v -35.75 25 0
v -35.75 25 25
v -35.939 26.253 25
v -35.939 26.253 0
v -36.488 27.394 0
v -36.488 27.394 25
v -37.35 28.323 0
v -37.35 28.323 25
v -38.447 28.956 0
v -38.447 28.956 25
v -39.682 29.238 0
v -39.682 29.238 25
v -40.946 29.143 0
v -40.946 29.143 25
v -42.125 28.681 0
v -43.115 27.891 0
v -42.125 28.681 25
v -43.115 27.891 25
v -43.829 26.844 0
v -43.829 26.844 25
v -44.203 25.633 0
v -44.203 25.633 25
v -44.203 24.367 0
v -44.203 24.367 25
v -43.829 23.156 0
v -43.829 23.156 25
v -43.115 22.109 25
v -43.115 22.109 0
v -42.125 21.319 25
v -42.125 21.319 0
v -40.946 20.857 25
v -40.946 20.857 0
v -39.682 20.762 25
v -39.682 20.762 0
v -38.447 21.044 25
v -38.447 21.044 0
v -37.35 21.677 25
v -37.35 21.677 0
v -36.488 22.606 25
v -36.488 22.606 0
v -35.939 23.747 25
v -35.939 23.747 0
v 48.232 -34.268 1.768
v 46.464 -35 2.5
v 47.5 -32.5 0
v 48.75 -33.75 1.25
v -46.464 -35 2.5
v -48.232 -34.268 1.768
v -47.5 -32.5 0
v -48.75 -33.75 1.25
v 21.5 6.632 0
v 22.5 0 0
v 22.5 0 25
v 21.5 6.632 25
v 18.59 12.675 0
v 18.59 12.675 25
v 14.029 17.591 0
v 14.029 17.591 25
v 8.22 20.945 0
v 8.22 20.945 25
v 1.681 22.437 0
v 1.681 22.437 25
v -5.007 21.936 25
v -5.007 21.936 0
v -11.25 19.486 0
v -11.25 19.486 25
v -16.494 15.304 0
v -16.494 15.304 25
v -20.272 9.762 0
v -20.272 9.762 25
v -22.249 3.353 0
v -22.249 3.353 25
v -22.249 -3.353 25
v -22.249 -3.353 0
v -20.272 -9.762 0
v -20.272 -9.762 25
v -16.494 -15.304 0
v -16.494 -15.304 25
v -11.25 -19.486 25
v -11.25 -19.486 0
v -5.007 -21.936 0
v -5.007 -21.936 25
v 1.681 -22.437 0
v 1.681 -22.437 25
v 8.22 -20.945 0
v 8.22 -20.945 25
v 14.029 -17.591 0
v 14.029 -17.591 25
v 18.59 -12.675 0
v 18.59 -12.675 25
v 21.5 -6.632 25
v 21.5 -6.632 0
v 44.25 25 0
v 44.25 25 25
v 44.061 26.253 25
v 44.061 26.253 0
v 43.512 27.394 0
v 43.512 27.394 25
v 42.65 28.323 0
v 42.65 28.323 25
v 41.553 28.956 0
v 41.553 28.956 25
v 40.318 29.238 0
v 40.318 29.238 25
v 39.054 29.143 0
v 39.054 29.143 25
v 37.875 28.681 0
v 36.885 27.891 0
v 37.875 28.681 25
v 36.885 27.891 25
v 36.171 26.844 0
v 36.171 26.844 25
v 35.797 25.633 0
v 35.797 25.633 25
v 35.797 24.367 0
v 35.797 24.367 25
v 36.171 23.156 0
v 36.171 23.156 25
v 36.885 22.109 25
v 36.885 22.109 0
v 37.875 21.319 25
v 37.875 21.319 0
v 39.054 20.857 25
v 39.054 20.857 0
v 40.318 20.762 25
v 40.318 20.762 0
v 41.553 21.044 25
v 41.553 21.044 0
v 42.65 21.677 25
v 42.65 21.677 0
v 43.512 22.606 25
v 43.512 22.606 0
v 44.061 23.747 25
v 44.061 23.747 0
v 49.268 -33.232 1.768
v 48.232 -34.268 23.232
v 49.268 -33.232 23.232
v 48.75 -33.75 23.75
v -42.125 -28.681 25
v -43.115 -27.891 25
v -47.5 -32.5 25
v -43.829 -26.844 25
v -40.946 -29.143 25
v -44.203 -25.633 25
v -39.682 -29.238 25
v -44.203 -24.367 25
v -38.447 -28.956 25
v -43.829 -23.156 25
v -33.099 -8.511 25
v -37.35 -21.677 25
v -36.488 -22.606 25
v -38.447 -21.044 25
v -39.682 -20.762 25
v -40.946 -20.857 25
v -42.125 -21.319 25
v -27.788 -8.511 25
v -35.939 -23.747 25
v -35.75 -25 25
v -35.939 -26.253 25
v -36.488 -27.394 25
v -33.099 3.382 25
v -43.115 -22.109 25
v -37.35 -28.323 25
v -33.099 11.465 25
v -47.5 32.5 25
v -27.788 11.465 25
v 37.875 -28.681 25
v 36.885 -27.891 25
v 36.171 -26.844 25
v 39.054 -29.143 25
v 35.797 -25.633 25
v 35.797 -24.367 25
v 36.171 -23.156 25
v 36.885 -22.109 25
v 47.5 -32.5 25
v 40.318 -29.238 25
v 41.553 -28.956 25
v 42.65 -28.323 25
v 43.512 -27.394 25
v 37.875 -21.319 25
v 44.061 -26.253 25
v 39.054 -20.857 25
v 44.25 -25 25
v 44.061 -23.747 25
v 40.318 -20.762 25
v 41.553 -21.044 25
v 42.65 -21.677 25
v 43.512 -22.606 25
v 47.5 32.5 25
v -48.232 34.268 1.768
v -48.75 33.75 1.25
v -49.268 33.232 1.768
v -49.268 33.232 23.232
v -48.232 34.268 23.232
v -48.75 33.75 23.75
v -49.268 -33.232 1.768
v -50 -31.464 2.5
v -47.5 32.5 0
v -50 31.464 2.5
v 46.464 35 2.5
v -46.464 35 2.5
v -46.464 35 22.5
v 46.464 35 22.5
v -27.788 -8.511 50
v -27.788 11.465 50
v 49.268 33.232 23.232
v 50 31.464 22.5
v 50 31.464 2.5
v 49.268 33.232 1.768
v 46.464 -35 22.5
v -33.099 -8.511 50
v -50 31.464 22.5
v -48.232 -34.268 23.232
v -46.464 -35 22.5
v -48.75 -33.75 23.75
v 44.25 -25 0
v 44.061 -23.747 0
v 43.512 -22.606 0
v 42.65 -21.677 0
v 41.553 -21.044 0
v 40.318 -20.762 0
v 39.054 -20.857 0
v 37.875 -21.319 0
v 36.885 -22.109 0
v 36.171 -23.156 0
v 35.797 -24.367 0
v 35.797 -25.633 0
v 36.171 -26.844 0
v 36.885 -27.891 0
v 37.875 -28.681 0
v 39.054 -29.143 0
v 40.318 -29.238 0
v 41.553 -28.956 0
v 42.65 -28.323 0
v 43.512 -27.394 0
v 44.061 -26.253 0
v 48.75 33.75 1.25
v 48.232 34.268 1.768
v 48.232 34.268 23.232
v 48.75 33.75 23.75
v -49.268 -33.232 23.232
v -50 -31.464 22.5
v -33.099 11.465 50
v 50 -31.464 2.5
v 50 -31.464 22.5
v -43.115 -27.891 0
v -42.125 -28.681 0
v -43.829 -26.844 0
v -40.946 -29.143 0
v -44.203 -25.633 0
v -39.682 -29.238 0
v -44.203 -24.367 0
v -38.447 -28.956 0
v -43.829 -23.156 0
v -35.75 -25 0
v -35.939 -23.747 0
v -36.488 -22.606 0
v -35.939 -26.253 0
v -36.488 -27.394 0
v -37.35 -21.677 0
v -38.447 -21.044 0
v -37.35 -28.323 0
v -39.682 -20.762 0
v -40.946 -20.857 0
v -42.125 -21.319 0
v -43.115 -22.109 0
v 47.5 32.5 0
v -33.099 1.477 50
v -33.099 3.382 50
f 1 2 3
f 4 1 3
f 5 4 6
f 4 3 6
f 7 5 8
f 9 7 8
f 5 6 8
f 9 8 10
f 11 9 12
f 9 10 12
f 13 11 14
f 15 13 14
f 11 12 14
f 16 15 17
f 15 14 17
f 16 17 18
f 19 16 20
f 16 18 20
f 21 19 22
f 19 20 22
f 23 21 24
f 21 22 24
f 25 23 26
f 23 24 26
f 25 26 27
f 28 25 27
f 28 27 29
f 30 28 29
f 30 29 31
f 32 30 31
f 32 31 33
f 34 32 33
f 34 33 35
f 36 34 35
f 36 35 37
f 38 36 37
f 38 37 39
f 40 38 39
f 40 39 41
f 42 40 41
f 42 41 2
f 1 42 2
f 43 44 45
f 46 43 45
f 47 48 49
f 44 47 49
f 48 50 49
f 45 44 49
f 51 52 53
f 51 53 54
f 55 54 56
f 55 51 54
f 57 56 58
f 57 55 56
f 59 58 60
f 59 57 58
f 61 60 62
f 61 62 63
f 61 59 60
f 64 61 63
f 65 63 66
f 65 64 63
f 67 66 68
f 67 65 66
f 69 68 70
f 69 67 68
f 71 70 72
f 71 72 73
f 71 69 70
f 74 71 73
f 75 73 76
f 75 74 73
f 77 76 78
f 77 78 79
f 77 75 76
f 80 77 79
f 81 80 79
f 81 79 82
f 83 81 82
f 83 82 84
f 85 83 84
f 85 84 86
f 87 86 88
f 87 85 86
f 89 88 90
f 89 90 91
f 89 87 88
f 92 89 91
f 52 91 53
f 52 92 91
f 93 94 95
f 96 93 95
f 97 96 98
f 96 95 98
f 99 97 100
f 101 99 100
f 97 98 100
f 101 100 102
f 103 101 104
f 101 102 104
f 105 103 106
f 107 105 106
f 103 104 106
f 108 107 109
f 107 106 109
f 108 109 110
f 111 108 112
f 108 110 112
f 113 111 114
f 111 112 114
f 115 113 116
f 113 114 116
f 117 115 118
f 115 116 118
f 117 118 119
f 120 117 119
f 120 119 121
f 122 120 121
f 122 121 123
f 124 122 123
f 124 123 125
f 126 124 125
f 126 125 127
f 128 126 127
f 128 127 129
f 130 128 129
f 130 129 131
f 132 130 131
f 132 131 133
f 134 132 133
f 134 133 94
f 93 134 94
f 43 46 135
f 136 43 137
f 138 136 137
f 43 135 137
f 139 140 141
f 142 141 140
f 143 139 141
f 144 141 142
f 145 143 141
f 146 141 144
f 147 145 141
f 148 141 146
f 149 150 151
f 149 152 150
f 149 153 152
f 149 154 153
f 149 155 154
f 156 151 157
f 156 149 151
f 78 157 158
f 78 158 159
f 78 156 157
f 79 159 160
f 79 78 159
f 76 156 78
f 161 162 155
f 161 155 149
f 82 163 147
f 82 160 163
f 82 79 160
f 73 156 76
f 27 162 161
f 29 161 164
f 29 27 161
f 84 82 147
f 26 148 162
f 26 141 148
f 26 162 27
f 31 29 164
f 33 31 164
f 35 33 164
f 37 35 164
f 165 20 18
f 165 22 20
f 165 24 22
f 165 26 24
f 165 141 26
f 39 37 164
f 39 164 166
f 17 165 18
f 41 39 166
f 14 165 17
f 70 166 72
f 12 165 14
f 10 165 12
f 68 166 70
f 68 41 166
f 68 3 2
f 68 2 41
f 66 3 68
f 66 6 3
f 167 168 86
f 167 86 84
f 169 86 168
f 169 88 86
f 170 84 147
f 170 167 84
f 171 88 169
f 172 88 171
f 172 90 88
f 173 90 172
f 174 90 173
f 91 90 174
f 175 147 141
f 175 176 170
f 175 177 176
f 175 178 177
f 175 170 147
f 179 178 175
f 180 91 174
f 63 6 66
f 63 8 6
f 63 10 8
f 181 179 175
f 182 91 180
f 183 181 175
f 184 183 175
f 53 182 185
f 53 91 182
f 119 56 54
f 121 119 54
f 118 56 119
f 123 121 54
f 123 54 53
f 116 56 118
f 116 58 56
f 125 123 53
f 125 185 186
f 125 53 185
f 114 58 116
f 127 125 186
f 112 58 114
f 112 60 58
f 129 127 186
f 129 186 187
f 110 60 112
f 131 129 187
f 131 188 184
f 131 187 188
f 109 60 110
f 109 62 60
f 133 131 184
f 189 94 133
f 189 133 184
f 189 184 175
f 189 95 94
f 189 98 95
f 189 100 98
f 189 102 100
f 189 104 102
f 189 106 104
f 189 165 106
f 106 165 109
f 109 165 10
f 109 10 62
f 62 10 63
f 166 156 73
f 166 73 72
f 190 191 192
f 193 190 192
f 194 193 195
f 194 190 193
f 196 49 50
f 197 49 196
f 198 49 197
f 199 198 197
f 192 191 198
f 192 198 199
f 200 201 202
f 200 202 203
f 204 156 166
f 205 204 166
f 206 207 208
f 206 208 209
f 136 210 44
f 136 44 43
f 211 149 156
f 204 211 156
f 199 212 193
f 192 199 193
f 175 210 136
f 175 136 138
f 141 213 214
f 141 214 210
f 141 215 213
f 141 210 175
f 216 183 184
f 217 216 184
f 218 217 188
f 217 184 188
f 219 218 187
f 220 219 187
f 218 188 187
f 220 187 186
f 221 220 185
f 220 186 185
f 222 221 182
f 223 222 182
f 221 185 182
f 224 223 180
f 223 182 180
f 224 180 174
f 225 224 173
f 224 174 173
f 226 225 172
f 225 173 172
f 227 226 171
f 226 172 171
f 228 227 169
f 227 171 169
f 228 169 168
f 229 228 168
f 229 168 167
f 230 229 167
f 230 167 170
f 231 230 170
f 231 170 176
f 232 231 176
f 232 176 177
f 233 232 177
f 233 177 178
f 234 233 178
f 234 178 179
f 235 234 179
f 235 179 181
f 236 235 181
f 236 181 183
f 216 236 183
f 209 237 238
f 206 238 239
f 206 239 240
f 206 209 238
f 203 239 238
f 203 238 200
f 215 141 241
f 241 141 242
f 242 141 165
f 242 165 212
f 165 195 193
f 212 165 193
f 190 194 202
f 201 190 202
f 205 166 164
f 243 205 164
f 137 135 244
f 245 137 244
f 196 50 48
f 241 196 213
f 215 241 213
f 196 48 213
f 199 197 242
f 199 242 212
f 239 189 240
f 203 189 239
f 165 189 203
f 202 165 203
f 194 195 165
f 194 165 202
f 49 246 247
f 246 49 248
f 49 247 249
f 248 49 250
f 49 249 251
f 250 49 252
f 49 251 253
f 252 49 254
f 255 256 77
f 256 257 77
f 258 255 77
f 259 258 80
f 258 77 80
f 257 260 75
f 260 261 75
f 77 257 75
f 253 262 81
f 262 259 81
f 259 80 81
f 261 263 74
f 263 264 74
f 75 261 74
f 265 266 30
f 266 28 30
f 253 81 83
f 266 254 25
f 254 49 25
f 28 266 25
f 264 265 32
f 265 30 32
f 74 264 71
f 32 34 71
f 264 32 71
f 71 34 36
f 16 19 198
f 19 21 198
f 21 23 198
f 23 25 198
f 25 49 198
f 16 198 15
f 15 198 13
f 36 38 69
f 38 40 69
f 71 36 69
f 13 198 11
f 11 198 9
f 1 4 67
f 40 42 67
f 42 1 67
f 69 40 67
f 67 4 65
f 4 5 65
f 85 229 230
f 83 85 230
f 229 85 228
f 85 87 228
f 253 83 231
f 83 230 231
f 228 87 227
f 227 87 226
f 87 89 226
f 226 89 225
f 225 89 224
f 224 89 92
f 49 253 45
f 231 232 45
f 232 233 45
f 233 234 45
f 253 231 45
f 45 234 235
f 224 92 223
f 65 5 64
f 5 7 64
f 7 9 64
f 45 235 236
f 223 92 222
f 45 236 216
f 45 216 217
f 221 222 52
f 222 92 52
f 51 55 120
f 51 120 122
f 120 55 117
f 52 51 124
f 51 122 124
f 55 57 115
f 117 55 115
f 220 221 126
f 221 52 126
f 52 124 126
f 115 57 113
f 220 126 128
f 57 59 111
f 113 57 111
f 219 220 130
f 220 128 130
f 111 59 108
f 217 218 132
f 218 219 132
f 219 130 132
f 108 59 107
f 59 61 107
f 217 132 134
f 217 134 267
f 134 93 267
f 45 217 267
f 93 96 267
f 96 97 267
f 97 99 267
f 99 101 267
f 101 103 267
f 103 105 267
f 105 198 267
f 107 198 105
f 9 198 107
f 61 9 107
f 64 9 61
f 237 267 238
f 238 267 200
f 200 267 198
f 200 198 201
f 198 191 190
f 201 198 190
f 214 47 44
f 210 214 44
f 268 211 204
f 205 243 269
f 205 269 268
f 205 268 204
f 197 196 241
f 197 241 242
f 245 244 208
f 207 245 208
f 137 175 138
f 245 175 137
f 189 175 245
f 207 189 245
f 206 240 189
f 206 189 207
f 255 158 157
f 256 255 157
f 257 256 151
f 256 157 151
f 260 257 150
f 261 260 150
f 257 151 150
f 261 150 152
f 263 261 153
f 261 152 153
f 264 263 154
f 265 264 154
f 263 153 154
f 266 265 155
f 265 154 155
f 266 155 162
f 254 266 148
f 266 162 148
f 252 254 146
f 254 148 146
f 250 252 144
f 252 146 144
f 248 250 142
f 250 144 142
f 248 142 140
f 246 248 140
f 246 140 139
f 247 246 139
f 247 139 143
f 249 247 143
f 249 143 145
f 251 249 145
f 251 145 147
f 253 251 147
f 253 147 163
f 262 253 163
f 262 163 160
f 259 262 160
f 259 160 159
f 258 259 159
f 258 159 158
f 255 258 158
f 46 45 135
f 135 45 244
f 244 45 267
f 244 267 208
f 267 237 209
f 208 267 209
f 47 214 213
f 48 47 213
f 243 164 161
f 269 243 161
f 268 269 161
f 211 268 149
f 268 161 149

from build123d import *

# Parameters (mm, degrees)
F0_W        = 100
F0_H        = 70
F0_R        = 22.5
F1_DEPTH    = 25
F2_R        = 4.25
F3_DEPTH    = 25.001
F4_SIZE     = 2.5
F5_T1_DEPTH = 77.8584149398
F5_T3_DEPTH = 30.6428543011
F5_T5_DEPTH = 107.8584149398
F6_W        = 0.4621222615
F6_H        = 1.904300414
F7_DEPTH    = 25


# Not quite as in the source:
# - a fillet or chamfer that OpenCascade refuses, or shapes differently, is made with other operations: its cross-section is extruded or revolved along the edge and cut away or added


with BuildPart() as f1:
    # F0 (on Top) → F1 (new body)
    with BuildSketch(Plane.XY):
        Rectangle(F0_W, F0_H)
        Circle(F0_R, mode=Mode.SUBTRACT)
    extrude(amount=F1_DEPTH)

    # F2 (on face) → F3 (cut, through all)
    with BuildSketch(Plane.XY.offset(25)):
        with Locations((-40, 25)):
            Circle(F2_R)
        with Locations((-40, -25)):
            Circle(F2_R)
        with Locations((40, -25)):
            Circle(F2_R)
        with Locations((40, 25)):
            Circle(F2_R)
    extrude(amount=-F3_DEPTH, mode=Mode.SUBTRACT)

    # F4
    f4_edges = [f1.edges().sort_by_distance(p)[0] for p in [
        (50, 35, 12.5),
        (50, -35, 12.5),
        (-50, -35, 12.5),
        (-50, 35, 12.5),
    ]]
    chamfer(f4_edges, length=F4_SIZE)

    # F5: chamfer of 2.5 on 16 edges, made by hand

    # F5_s2 → F5_t1 (cut)
    with BuildSketch(Plane.XZ.offset(-38.9292074699)):
        Polygon((47.5, 25), (50, 22.5), (50, 25), align=None)
        Polygon((47.5, 0), (50, 2.5), (50, 0), align=None)
        Polygon((-47.5, 0), (-50, 2.5), (-50, 0), align=None)
        Polygon((-47.5, 25), (-50, 22.5), (-50, 25), align=None)
    extrude(amount=F5_T1_DEPTH, mode=Mode.SUBTRACT)

    # F5_s4 → F5_t3 (cut)
    with BuildSketch(Plane.XY.offset(-2.8214271505)):
        Polygon((49.267766953, -33.232233047), (50, -31.4644660941), (50, -32.5), align=None)
        Polygon((50, 31.4644660941), (49.267766953, 33.232233047), (50, 32.5), align=None)
        Polygon((-46.4644660941, -35), (-48.232233047, -34.267766953), (-47.5, -35), align=None)
        Polygon((46.4644660941, -35), (48.232233047, -34.267766953), (47.5, -35), align=None)
        Polygon((-50, 31.4644660941), (-49.267766953, 33.232233047), (-50, 32.5), align=None)
        Polygon((-49.267766953, -33.232233047), (-50, -31.4644660941), (-50, -32.5), align=None)
        Polygon((48.232233047, 34.267766953), (46.4644660941, 35), (47.5, 35), align=None)
        Polygon((-48.232233047, 34.267766953), (-46.4644660941, 35), (-47.5, 35), align=None)
    extrude(amount=F5_T3_DEPTH, mode=Mode.SUBTRACT)

    # F5_s6 → F5_t5 (cut)
    with BuildSketch(Plane.YZ.offset(-53.9292074699)):
        Polygon((-35, 2.5), (-32.5, 0), (-35, 0), align=None)
        Polygon((-35, 22.5), (-32.5, 25), (-35, 25), align=None)
        Polygon((32.5, 0), (35, 2.5), (35, 0), align=None)
        Polygon((32.5, 25), (35, 22.5), (35, 25), align=None)
    extrude(amount=F5_T5_DEPTH, mode=Mode.SUBTRACT)

    # F6 (on face) → F7 (join)
    with BuildSketch(Plane.XY.offset(25)):
        Polygon((-33.0991968513, 1.4772834256), (-33.0991968513, -8.5106156766), (-27.7881808579, -8.5106156766), (-27.7881808579, 11.4651825279), (-33.0991968513, 11.4651825279), (-33.0991968513, 3.3815838397), (-32.6370745897, 3.3815838397), (-32.6370745897, 1.4772834256), align=None)
        with Locations((-32.8681357205, 2.4294336326)):
            Rectangle(F6_W, F6_H)
    extrude(amount=F7_DEPTH)


solid = f1.part
